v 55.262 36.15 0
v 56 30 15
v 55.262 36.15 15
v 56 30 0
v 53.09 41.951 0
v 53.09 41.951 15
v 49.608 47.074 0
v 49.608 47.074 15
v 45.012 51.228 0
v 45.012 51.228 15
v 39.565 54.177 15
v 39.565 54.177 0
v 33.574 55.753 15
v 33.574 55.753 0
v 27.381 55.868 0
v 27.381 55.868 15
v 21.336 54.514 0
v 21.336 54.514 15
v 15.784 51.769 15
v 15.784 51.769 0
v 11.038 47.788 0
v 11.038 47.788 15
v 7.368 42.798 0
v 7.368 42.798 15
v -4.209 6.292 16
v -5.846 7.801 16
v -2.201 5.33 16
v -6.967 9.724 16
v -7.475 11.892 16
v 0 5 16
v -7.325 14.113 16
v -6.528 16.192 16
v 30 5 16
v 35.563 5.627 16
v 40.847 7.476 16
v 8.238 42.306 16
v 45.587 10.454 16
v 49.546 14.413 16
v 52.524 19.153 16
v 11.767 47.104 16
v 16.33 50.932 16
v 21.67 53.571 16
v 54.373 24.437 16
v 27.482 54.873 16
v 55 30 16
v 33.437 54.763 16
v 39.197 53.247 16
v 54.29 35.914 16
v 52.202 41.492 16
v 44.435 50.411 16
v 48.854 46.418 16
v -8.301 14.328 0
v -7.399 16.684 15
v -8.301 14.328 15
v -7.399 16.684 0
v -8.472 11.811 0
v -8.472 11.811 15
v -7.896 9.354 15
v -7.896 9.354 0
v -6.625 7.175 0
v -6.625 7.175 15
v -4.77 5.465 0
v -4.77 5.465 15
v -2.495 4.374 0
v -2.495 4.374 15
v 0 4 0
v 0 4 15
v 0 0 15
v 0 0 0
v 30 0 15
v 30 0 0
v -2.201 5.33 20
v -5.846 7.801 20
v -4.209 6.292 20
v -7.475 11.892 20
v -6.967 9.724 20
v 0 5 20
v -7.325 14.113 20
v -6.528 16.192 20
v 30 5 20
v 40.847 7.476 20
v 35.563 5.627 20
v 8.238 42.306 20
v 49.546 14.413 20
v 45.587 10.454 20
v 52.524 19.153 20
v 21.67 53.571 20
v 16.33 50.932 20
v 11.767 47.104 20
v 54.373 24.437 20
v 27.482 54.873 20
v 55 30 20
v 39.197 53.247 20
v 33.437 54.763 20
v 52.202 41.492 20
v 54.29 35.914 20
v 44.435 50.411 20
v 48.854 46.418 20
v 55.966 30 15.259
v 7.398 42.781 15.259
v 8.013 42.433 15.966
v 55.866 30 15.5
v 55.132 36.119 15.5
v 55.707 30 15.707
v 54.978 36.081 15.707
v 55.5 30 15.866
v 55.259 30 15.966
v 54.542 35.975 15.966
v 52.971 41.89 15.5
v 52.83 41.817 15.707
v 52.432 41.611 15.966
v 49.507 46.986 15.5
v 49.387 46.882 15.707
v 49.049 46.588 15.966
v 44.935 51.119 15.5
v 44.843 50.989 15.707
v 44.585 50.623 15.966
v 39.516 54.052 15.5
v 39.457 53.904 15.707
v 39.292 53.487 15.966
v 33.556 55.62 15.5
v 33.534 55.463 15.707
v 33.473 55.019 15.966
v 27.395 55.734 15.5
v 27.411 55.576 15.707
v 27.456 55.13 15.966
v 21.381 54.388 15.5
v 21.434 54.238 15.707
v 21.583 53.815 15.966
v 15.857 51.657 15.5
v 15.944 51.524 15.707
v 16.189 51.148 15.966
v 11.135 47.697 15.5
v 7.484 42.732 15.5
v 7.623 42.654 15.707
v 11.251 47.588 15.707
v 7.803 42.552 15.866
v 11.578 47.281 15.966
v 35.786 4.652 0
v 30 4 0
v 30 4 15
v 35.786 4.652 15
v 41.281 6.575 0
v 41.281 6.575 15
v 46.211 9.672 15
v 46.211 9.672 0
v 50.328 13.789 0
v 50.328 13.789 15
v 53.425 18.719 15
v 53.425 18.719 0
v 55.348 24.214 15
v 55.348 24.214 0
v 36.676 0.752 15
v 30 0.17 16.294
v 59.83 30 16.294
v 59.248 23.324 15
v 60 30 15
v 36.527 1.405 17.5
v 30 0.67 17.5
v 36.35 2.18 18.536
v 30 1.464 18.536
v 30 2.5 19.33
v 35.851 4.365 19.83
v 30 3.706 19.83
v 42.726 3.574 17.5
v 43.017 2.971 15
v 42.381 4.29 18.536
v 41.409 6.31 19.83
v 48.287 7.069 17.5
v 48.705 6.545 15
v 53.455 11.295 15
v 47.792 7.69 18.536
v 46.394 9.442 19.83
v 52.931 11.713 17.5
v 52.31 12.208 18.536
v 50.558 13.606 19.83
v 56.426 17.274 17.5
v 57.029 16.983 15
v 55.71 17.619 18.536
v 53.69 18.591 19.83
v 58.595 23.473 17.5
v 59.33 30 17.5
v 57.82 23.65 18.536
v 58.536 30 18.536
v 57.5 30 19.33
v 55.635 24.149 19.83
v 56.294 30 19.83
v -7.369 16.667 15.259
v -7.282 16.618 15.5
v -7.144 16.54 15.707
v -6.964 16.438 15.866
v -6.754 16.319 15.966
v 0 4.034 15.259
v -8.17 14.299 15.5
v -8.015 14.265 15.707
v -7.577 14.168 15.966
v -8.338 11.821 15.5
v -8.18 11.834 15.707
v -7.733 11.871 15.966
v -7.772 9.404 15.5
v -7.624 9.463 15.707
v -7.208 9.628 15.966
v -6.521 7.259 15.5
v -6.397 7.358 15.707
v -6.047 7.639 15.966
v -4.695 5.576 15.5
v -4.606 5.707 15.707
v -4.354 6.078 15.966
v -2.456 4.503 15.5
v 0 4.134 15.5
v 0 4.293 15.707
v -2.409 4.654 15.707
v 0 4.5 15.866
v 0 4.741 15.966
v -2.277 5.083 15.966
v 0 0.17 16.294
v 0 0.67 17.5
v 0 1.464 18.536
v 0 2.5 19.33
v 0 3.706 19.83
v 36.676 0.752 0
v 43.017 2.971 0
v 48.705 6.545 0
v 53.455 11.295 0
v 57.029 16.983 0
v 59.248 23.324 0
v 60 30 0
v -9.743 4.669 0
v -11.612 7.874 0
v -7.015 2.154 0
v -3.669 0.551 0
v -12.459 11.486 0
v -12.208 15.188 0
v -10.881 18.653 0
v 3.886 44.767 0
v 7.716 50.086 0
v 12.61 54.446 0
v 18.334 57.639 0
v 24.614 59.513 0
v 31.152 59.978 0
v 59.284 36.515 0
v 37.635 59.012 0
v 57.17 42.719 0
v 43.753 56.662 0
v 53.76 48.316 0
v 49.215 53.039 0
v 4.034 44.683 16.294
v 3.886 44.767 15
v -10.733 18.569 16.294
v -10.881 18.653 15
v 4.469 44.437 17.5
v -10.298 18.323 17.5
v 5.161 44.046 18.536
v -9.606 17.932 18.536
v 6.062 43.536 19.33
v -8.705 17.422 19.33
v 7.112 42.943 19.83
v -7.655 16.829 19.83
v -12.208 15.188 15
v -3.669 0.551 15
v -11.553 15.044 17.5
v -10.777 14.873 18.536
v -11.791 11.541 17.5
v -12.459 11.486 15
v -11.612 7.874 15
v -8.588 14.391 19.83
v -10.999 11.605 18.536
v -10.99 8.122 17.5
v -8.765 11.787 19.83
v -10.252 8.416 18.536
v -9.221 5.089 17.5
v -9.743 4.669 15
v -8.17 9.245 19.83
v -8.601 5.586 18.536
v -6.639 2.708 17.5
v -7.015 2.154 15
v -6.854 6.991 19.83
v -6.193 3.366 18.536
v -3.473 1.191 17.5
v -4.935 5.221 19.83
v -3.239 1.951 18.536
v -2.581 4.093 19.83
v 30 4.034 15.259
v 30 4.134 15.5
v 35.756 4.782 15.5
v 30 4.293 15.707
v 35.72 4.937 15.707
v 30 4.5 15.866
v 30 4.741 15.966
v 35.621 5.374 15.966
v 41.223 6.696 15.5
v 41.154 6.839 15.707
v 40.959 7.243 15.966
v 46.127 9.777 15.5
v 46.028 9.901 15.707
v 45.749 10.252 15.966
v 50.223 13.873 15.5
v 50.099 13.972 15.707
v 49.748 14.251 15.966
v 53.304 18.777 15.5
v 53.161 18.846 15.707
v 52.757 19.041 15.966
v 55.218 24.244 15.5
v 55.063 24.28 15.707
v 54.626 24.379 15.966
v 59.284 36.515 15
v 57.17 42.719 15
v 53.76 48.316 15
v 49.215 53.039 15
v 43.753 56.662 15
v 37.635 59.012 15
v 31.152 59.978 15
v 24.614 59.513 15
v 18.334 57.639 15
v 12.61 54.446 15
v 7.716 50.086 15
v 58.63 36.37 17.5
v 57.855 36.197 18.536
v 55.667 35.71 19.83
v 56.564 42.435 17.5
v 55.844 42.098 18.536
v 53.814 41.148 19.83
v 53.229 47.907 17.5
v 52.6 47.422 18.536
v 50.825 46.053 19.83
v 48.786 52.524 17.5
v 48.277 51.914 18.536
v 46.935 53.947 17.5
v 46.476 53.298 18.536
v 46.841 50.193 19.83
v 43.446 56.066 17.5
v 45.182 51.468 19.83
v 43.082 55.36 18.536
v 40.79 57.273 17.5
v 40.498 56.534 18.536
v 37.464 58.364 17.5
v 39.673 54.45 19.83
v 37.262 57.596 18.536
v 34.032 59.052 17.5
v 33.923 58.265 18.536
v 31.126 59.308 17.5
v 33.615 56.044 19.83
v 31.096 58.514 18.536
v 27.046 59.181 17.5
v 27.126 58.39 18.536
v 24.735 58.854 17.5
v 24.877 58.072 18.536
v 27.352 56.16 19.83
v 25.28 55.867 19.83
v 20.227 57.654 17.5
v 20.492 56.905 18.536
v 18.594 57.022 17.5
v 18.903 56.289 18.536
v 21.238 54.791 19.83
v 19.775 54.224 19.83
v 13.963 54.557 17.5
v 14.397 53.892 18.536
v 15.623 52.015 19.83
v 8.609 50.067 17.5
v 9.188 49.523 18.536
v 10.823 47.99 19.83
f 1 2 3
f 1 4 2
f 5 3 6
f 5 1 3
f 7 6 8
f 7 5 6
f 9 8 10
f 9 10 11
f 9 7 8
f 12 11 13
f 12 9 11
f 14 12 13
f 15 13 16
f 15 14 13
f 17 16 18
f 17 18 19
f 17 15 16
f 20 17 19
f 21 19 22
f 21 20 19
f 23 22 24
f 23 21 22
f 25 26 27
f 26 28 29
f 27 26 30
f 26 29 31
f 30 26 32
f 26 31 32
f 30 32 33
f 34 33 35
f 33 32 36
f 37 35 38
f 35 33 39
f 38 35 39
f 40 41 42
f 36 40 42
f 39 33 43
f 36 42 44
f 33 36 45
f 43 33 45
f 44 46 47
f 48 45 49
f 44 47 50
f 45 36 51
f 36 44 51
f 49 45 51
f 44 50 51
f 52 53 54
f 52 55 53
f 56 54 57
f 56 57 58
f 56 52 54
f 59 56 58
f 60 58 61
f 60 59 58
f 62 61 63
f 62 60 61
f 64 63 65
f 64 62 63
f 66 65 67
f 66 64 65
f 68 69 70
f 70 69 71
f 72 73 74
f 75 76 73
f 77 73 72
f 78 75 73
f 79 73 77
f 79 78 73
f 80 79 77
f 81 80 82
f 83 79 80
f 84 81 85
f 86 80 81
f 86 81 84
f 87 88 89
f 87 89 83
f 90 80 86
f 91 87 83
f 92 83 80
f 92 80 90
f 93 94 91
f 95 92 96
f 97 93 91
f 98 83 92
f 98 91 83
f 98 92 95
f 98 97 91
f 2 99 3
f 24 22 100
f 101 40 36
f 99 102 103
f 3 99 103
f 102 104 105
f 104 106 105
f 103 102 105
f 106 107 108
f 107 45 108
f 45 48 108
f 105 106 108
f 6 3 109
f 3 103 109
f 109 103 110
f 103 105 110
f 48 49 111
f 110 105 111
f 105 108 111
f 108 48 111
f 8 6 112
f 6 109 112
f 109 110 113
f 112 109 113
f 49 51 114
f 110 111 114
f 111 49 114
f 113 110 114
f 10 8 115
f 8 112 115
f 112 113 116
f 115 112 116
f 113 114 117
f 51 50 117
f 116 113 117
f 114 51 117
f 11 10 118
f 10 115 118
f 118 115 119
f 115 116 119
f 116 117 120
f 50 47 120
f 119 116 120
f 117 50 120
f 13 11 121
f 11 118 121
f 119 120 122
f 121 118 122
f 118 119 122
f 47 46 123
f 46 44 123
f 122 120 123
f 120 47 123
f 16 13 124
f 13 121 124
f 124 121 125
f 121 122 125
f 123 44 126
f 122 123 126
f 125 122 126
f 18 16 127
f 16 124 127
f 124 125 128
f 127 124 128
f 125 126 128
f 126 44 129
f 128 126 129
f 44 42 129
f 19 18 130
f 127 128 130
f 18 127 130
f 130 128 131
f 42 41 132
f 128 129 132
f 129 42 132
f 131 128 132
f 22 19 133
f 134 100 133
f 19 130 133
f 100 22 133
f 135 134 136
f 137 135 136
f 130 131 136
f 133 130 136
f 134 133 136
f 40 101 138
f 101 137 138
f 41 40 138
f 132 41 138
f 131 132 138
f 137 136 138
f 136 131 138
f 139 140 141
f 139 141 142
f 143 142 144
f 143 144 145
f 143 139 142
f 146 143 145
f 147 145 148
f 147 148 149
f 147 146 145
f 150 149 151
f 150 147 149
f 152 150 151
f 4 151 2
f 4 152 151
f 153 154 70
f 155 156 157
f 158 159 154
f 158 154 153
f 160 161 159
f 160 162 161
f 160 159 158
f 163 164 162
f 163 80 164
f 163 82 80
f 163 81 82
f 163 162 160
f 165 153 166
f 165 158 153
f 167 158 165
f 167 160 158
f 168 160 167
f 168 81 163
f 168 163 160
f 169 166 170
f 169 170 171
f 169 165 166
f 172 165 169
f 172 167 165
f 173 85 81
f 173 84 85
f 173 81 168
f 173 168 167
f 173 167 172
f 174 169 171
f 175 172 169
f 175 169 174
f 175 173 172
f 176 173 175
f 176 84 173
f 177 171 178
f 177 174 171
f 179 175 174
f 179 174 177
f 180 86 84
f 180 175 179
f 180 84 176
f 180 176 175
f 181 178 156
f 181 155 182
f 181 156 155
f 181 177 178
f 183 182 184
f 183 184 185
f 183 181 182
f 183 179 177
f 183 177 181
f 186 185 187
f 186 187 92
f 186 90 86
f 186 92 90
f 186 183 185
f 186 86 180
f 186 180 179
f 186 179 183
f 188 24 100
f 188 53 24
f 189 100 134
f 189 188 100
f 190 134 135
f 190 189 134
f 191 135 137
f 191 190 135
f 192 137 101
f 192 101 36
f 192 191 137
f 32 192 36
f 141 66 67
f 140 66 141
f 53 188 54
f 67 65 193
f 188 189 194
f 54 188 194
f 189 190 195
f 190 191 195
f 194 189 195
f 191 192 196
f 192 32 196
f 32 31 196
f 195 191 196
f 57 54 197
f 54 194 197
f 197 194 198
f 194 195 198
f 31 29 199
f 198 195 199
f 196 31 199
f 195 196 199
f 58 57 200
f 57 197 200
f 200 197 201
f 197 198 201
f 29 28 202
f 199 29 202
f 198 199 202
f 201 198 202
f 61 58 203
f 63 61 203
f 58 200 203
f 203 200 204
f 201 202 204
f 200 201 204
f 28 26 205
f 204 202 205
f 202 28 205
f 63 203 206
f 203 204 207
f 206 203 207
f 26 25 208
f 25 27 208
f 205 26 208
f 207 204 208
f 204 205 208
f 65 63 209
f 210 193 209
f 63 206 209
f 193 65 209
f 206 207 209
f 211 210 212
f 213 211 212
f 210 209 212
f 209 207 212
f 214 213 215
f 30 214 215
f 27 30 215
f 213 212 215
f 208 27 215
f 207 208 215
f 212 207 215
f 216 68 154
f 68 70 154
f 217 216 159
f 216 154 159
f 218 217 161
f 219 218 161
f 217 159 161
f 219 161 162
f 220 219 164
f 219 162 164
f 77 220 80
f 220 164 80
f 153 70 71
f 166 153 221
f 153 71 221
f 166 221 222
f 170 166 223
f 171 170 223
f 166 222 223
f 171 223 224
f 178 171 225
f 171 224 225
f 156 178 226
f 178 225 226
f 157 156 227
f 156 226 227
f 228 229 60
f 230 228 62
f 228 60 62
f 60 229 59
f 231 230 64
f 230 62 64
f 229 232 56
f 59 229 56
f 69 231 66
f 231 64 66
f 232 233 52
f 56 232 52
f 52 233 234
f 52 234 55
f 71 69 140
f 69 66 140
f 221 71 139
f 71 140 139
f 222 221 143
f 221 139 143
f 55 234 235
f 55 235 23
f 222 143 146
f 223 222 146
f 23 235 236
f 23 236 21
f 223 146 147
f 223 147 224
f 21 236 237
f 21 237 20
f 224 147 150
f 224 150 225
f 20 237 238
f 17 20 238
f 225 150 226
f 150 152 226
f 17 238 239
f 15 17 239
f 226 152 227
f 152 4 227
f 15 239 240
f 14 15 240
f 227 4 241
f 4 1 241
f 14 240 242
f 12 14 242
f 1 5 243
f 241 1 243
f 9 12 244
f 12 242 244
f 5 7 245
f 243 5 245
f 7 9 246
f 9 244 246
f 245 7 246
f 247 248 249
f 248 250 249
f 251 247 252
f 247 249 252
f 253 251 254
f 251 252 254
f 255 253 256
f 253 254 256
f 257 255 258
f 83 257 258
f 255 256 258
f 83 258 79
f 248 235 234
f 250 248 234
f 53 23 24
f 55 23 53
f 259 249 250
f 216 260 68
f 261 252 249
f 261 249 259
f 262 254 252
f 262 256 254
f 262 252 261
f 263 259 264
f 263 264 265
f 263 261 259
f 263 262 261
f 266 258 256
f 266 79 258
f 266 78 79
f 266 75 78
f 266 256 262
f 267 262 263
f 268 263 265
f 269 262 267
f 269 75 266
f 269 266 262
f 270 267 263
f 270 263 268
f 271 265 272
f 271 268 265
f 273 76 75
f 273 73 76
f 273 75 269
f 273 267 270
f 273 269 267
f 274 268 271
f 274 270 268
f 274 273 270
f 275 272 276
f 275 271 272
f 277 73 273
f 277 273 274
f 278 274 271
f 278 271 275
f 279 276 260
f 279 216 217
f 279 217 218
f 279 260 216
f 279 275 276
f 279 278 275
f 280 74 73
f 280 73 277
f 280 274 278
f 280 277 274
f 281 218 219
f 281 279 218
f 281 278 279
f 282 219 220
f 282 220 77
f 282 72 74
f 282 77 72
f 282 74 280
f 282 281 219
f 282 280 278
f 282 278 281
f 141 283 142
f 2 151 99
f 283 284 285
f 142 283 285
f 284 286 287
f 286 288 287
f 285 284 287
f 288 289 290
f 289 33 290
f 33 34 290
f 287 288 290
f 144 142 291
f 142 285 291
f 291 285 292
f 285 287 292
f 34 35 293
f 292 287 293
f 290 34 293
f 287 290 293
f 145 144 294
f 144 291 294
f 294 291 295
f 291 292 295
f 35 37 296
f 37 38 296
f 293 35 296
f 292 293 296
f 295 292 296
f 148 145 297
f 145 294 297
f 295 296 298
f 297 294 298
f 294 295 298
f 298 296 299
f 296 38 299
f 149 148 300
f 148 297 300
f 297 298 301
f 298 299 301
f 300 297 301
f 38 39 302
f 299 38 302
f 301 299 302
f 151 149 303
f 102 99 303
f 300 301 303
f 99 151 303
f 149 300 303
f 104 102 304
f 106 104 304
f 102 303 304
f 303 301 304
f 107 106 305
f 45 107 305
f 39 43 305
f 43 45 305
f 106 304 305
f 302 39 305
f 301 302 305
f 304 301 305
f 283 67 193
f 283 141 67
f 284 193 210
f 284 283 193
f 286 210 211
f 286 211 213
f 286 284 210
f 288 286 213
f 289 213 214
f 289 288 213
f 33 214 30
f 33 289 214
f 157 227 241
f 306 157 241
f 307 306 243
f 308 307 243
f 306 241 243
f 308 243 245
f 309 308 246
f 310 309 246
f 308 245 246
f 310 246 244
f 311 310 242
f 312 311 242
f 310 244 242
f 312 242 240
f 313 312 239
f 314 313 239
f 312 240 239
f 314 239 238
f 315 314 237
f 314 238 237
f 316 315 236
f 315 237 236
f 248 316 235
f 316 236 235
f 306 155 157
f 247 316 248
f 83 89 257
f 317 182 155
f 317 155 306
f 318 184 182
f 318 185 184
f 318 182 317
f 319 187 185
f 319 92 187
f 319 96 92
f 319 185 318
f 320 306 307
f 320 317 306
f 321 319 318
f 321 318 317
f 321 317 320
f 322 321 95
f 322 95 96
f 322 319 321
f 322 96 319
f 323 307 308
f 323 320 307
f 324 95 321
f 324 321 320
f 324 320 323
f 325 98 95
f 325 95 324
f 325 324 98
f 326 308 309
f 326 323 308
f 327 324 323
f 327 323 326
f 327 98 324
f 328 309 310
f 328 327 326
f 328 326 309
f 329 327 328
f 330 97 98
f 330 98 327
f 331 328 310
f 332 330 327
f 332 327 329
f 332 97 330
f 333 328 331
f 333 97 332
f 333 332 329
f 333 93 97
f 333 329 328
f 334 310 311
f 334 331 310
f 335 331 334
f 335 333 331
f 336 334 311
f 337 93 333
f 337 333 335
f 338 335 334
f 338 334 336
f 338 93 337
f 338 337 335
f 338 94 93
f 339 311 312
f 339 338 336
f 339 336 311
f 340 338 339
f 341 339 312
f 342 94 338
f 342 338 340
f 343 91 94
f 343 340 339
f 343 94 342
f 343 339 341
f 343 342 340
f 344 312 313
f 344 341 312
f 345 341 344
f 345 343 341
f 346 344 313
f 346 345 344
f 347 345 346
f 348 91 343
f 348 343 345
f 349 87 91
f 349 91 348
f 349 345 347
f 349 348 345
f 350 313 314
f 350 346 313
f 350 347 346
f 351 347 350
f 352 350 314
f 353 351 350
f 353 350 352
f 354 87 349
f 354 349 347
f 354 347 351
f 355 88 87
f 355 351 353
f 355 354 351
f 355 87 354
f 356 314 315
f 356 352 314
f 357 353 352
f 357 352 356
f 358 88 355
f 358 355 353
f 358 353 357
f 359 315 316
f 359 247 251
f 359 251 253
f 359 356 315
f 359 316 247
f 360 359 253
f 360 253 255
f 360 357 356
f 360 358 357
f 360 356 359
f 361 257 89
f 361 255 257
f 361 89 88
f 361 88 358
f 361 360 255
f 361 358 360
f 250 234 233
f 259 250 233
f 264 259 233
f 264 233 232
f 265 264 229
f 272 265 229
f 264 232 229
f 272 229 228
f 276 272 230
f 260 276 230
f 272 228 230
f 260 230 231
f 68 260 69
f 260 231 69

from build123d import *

# Parameters (mm, degrees)
F1_DEPTH = 20
F2_R     = 5
F3_T     = -4


with BuildPart() as f1:
    # F0 (on Top) → F1 (new body)
    with BuildSketch(Plane.XY):
        with BuildLine():
            ThreePointArc((30, 0), (51.2132034356, 8.7867965644), (60, 30))
            ThreePointArc((60, 30), (37.6347989784, 59.0122361179), (3.8860103627, 44.7668393782))
            ThreePointArc((3.8860103627, 44.7668393782), (0.4502981981, 35.1783321081), (0.4207995235, 24.9929151026))
            ThreePointArc((0.4207995235, 24.9929151026), (8.9863784152, 21.1887860474), (12.5, 12.5))
            ThreePointArc((12.5, 12.5), (12.1402716069, 9.5227856456), (11.0817911501, 6.716929457))
            ThreePointArc((11.0817911501, 6.716929457), (19.9623736942, 1.7290598291), (30, 0))
        make_face()
        with BuildLine():
            ThreePointArc((0.4207995235, 24.9929151026), (0.4502981981, 35.1783321081), (3.8860103627, 44.7668393782))
            Line((3.8860103627, 44.7668393782), (-10.8808290155, 18.6528497409))
            ThreePointArc((-10.8808290155, 18.6528497409), (-6.1157306547, 23.4017355755), (0.4207995235, 24.9929151026))
        make_face()
        with BuildLine():
            Line((0, 0), (30, 0))
            ThreePointArc((30, 0), (19.9623736942, 1.7290598291), (11.0817911501, 6.716929457))
            ThreePointArc((11.0817911501, 6.716929457), (6.4792599196, 1.8103231623), (0, 0))
        make_face()
        with BuildLine():
            ThreePointArc((11.0817911501, 6.716929457), (4.086632973, 14.8838692343), (0.4207995235, 24.9929151026))
            ThreePointArc((0.4207995235, 24.9929151026), (-6.1157306547, 23.4017355755), (-10.8808290155, 18.6528497409))
            ThreePointArc((-10.8808290155, 18.6528497409), (-10.7972362612, 6.2016121809), (0, 0))
            ThreePointArc((0, 0), (6.4792599196, 1.8103231623), (11.0817911501, 6.716929457))
        make_face()
        with BuildLine():
            ThreePointArc((12.5, 12.5), (8.9863784152, 21.1887860474), (0.4207995235, 24.9929151026))
            ThreePointArc((0.4207995235, 24.9929151026), (4.086632973, 14.8838692343), (11.0817911501, 6.716929457))
            ThreePointArc((11.0817911501, 6.716929457), (12.1402716069, 9.5227856456), (12.5, 12.5))
        make_face()
    extrude(amount=F1_DEPTH)

    # F2
    f2_edges = [f1.edges().sort_by_distance(p)[0] for p in [
        (55.913367, 45.116131, 20),
        (-3.497409, 31.709845, 20),
        (-10.797236, 6.201612, 20),
        (15, 0, 20),
    ]]
    fillet(f2_edges, radius=F2_R)

    # F3
    f3_openings = [f1.faces().sort_by_distance(p)[0] for p in [
        (25.443673, 27.342143, 0),
    ]]
    offset(amount=F3_T, openings=f3_openings)


solid = f1.part
